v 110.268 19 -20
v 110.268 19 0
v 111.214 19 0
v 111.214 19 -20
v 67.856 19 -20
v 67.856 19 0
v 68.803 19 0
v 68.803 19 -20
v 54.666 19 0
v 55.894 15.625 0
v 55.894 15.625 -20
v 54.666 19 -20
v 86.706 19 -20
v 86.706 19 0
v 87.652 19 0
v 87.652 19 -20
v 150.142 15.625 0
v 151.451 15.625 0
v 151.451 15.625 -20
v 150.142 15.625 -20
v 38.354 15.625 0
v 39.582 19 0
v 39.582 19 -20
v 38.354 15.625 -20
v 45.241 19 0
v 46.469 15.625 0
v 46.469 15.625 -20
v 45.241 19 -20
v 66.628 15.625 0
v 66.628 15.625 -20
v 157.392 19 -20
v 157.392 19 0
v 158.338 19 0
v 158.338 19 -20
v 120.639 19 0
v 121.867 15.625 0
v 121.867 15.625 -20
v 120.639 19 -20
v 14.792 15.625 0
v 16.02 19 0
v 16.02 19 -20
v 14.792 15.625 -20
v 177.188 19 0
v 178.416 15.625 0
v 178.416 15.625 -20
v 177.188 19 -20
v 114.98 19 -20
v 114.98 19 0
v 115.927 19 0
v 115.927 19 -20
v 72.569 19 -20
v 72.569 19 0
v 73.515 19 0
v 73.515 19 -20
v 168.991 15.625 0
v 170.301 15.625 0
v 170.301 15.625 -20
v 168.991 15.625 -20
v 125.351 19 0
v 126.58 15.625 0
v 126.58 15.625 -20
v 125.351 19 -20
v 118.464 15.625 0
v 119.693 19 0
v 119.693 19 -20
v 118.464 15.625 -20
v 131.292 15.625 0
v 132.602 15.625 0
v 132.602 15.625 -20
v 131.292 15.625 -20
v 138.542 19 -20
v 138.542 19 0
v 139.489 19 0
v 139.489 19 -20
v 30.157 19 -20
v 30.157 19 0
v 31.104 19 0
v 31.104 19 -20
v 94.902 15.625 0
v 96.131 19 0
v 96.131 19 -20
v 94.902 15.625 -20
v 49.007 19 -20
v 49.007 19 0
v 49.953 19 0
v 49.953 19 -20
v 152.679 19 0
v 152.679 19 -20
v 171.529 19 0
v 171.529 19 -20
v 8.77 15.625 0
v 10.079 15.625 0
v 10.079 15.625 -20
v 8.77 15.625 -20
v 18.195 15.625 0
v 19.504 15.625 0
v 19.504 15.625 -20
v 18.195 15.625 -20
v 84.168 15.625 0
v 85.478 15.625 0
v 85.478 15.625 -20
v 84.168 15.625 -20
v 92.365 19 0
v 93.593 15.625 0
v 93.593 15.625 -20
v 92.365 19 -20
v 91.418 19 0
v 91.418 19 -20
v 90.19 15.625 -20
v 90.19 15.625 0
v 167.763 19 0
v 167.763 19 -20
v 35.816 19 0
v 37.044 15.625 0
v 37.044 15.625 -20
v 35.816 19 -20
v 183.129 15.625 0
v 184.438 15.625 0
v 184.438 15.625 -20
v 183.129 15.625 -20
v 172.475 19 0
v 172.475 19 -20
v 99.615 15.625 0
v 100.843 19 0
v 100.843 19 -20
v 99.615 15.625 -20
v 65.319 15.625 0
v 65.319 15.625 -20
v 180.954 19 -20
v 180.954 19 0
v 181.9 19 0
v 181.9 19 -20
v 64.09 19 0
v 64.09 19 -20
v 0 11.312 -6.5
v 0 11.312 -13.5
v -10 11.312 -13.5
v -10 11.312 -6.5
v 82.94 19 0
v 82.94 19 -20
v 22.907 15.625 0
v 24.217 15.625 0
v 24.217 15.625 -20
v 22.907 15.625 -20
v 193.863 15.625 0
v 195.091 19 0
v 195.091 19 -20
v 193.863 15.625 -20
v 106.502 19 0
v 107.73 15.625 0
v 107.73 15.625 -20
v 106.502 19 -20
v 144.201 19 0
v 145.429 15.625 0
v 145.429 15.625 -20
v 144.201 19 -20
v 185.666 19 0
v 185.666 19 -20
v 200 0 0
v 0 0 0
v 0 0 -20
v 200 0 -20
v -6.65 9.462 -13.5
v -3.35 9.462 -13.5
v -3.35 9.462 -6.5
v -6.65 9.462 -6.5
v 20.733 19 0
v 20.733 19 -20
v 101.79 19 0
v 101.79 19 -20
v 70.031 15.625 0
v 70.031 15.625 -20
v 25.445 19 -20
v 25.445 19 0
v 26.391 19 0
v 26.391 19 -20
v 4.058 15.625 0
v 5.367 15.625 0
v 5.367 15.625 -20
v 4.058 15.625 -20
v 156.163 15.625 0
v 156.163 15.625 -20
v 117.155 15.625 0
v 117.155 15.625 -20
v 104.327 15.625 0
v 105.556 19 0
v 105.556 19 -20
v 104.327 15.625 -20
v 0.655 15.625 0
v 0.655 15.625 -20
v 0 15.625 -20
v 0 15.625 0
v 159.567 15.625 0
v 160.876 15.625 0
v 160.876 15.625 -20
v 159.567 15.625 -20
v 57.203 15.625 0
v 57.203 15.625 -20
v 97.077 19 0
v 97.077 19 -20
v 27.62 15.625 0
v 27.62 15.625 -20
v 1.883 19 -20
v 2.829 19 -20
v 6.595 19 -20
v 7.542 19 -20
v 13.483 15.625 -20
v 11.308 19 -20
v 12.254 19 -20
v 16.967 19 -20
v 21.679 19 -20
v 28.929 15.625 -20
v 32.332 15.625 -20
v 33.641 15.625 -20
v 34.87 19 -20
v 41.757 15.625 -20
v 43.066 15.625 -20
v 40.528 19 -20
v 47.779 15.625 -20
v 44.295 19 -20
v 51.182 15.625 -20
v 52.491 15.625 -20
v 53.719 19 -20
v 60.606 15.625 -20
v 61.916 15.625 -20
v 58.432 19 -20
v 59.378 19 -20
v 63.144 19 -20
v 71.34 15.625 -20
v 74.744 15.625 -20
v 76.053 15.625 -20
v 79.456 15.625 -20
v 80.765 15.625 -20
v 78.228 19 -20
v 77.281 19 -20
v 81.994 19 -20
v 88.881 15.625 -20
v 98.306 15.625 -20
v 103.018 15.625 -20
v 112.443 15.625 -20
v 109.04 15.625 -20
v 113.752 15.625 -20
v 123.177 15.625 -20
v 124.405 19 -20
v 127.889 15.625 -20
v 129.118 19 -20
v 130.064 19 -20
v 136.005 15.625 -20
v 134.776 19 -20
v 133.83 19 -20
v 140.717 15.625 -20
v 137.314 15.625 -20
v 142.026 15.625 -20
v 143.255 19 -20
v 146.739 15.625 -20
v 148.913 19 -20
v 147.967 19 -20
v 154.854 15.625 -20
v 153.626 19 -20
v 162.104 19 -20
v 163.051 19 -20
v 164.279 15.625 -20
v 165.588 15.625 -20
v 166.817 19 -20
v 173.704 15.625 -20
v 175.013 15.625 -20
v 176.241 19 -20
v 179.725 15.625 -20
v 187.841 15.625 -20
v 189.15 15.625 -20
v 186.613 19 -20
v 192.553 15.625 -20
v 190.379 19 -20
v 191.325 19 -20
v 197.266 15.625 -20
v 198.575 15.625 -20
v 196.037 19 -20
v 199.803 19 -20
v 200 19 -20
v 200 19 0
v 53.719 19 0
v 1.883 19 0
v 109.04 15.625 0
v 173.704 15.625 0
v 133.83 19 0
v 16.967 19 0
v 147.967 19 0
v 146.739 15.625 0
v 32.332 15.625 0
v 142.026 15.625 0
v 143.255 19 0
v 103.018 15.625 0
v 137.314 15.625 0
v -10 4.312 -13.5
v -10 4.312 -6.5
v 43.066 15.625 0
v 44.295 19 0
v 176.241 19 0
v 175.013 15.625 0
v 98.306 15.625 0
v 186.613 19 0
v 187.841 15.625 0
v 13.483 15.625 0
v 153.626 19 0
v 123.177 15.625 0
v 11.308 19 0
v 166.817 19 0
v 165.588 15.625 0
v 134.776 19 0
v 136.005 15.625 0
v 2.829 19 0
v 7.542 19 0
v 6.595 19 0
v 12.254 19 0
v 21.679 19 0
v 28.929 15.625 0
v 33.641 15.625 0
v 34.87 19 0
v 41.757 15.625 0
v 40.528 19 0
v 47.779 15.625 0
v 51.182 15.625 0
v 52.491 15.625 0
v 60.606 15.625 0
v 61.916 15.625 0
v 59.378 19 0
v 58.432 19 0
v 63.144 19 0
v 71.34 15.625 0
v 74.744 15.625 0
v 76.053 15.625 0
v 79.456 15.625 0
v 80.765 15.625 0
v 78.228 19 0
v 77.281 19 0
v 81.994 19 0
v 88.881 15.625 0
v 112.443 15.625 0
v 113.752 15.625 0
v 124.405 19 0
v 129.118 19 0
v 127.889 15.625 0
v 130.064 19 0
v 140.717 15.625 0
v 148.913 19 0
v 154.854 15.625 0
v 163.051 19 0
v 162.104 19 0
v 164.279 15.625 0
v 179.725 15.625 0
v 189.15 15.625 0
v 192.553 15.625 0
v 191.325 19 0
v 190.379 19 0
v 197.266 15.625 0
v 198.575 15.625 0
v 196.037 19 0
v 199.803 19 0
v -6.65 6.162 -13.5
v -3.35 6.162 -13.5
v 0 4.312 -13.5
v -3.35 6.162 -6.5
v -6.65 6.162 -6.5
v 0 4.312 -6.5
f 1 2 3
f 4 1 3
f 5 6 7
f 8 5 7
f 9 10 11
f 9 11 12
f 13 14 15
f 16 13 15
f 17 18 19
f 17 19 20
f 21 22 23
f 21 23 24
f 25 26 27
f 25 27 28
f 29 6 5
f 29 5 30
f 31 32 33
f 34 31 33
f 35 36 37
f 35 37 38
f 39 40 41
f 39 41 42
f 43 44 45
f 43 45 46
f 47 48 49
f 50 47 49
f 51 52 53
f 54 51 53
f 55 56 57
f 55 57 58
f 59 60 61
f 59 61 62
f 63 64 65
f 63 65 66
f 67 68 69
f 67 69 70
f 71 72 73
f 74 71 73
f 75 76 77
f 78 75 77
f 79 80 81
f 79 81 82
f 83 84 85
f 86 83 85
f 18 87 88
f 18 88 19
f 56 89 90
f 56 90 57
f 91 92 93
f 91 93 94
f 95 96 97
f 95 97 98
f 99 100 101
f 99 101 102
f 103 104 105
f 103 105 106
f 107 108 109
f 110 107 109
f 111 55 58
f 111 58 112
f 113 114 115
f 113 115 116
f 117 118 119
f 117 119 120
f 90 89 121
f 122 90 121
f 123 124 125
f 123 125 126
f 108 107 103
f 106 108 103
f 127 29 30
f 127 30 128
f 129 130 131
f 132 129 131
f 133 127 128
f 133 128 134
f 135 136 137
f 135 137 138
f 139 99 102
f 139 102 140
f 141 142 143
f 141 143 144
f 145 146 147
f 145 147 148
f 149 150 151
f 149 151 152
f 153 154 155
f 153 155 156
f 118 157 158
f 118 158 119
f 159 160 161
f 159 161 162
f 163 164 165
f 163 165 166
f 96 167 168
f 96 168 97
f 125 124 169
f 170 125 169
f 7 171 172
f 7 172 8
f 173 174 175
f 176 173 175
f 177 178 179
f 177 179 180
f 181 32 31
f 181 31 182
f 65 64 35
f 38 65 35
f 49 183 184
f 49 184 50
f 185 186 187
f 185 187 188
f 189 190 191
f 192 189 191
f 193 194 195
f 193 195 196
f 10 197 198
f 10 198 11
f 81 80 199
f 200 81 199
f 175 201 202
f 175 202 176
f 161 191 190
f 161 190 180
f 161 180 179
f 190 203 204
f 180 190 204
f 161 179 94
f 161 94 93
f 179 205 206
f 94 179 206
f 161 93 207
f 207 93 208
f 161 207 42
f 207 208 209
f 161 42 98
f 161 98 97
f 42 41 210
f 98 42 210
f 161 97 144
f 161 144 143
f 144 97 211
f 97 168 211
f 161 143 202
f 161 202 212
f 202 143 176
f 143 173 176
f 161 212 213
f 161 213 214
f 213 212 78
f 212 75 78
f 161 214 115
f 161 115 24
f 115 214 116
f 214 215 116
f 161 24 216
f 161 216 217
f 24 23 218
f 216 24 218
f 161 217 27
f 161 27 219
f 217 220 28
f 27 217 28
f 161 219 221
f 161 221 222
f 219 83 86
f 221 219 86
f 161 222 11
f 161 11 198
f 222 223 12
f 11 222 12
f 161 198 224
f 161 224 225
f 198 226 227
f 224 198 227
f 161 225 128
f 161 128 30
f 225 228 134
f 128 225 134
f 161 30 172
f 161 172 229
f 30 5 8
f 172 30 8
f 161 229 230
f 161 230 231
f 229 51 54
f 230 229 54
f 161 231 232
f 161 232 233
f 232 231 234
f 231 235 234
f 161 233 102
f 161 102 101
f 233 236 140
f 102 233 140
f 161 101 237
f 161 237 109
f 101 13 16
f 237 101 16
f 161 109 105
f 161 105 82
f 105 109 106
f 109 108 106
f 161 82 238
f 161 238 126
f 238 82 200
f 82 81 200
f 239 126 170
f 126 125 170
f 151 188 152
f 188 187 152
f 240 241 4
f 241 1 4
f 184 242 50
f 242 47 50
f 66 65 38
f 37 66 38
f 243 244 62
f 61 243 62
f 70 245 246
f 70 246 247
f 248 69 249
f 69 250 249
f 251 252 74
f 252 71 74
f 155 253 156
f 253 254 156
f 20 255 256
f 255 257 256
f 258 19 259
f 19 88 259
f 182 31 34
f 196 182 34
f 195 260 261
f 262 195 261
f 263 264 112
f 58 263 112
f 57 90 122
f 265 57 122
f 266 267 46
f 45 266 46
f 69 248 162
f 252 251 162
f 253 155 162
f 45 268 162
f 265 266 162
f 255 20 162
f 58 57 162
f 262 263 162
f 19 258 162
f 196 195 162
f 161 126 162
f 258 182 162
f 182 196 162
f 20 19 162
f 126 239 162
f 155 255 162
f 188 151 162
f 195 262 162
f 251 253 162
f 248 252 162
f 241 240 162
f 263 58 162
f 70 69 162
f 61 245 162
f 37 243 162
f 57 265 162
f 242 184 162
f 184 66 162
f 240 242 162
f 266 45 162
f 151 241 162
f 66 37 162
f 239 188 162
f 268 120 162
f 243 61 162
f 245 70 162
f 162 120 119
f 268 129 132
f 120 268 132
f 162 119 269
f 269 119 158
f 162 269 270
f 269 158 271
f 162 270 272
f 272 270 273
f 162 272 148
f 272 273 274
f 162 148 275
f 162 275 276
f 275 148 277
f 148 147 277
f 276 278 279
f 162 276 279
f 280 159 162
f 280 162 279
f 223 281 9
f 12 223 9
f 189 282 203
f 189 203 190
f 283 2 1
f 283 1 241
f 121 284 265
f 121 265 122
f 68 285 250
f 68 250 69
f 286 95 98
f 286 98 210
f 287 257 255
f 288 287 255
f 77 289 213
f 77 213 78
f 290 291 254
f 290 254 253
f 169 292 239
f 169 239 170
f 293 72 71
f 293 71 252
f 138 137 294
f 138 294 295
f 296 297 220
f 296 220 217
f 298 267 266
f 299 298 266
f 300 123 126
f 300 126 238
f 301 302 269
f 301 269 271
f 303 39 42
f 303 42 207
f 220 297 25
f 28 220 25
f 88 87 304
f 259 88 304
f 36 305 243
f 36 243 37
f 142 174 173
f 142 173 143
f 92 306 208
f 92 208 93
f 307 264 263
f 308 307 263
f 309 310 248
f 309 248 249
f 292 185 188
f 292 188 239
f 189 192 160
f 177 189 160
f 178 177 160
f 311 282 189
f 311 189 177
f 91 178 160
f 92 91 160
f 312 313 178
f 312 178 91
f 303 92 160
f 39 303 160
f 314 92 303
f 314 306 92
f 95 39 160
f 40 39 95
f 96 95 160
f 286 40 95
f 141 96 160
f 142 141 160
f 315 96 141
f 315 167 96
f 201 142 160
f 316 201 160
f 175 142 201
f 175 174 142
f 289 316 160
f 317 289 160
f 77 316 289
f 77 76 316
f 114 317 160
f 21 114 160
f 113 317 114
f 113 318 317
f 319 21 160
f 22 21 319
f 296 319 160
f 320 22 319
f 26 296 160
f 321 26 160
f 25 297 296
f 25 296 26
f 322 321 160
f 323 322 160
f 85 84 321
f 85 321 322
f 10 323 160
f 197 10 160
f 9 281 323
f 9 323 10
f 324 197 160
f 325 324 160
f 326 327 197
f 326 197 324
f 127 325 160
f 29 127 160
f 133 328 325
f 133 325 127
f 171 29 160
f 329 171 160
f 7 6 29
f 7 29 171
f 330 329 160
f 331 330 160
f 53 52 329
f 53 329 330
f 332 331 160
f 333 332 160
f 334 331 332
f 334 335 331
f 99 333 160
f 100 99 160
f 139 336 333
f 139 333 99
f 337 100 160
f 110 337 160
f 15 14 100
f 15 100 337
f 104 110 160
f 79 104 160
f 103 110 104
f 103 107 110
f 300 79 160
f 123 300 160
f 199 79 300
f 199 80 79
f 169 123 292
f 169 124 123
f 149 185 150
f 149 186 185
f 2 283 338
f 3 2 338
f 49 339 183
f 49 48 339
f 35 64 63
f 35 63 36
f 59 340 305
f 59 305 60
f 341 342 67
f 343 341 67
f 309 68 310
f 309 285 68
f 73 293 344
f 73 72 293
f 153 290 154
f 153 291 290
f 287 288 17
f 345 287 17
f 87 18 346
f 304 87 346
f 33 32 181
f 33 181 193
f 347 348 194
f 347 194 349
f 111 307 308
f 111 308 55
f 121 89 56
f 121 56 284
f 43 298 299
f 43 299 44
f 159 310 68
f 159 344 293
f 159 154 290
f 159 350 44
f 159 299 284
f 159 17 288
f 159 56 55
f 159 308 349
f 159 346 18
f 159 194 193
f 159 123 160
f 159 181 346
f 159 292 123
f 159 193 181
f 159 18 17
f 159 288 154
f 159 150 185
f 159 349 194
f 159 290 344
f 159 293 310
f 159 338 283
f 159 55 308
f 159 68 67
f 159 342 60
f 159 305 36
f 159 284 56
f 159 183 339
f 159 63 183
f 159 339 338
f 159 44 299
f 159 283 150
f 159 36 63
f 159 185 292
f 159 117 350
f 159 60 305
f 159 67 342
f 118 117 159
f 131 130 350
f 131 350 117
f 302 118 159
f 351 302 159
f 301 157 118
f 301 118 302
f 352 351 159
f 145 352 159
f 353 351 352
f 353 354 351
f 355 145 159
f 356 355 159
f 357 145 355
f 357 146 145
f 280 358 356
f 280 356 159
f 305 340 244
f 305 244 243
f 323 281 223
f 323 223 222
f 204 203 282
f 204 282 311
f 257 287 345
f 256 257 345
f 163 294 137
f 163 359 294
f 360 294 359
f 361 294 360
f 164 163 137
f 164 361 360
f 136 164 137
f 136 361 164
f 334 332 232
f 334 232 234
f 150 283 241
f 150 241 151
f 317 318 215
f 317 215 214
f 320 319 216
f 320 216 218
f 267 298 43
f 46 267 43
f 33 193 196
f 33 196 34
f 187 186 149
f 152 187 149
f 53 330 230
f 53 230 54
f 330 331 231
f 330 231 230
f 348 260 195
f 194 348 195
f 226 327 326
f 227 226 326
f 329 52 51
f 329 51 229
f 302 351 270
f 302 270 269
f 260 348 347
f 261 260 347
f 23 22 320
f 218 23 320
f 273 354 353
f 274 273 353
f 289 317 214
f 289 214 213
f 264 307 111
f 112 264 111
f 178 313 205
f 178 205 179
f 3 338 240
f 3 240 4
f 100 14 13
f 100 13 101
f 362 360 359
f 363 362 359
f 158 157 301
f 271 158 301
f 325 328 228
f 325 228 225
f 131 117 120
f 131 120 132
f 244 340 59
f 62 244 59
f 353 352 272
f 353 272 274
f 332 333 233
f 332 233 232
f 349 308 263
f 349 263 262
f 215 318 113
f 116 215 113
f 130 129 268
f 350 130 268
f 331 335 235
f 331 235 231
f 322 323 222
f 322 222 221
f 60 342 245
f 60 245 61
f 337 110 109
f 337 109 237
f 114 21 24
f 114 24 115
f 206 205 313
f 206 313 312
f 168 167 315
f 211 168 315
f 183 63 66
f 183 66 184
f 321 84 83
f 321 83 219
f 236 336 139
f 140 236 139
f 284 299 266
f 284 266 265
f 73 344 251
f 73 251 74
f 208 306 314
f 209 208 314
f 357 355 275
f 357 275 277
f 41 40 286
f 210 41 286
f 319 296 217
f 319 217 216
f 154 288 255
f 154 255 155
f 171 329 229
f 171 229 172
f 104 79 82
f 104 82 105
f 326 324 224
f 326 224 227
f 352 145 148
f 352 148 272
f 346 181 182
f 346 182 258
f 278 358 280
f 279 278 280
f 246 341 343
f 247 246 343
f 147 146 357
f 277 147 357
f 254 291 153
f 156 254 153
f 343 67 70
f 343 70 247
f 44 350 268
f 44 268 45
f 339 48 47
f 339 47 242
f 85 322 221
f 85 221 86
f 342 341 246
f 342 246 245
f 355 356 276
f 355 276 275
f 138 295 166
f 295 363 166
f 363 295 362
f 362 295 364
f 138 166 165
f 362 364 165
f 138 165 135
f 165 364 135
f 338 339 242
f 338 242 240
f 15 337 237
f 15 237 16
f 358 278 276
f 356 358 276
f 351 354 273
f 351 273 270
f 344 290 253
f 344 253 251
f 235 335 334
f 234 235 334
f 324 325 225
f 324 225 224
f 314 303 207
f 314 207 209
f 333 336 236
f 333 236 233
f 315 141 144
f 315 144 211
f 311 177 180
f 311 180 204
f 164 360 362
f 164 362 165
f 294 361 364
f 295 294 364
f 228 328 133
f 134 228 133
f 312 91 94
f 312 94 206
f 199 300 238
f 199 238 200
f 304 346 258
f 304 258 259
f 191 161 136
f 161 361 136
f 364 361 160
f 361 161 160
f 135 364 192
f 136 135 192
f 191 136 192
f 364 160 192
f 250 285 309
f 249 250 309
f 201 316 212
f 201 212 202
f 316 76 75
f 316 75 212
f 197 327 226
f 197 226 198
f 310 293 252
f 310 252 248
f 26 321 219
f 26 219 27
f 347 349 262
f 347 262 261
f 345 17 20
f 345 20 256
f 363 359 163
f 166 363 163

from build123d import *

# Parameters (mm, degrees)
BLANKSKE_W          = 200
BLANKSKE_H          = 19
BLANK_DEPTH         = 20
TOOTHCUTSIM_DEPTH   = 202.893536301
TEETHCUTS_COUNT     = 43
TEETHCUTS_PITCH     = 4.712388975
SKETCH3_W           = 7
SKETCH3_H           = 7
BOSS_EXTRUDE2_DEPTH = 10
SKETCH4_W           = 3.3
SKETCH4_H           = 3.3
CUT_EXTRUDE1_DEPTH  = 25


with BuildPart() as part:
    # BlankSke → Blank (new body)
    with BuildSketch(Plane.XY):
        with Locations((100, 9.5)):
            Rectangle(BLANKSKE_W, BLANKSKE_H)
    extrude(amount=-BLANK_DEPTH)

    # TooCutSkeSim → ToothCutSim (cut, through all)
    with BuildSketch(Plane.XY):
        Polygon((0.654653055, 15.625), (-0.654653055, 15.625), (-1.892297439, 19.0254), (1.892297439, 19.0254), align=None)
    toothcutsim = extrude(amount=-TOOTHCUTSIM_DEPTH, mode=Mode.SUBTRACT)

    # TeethCuts: ToothCutSim ×43
    with Locations(*[(i * TEETHCUTS_PITCH, 0, 0) for i in range(1, TEETHCUTS_COUNT)]):
        add(toothcutsim, mode=Mode.SUBTRACT)

    # Sketch3 → Boss-Extrude2 (add)
    with BuildSketch(Plane.ZY):
        with Locations((-10, 7.8125)):
            Rectangle(SKETCH3_W, SKETCH3_H)
    extrude(amount=BOSS_EXTRUDE2_DEPTH)

    # Sketch4 → Cut-Extrude1 (cut)
    with BuildSketch(Plane(origin=(0, 0, -13.5), x_dir=(-1, 0, 0), z_dir=(0, 0, -1))):
        with Locations((5, 7.8125)):
            Rectangle(SKETCH4_W, SKETCH4_H)
    extrude(amount=-CUT_EXTRUDE1_DEPTH, mode=Mode.SUBTRACT)


solid = part.part
